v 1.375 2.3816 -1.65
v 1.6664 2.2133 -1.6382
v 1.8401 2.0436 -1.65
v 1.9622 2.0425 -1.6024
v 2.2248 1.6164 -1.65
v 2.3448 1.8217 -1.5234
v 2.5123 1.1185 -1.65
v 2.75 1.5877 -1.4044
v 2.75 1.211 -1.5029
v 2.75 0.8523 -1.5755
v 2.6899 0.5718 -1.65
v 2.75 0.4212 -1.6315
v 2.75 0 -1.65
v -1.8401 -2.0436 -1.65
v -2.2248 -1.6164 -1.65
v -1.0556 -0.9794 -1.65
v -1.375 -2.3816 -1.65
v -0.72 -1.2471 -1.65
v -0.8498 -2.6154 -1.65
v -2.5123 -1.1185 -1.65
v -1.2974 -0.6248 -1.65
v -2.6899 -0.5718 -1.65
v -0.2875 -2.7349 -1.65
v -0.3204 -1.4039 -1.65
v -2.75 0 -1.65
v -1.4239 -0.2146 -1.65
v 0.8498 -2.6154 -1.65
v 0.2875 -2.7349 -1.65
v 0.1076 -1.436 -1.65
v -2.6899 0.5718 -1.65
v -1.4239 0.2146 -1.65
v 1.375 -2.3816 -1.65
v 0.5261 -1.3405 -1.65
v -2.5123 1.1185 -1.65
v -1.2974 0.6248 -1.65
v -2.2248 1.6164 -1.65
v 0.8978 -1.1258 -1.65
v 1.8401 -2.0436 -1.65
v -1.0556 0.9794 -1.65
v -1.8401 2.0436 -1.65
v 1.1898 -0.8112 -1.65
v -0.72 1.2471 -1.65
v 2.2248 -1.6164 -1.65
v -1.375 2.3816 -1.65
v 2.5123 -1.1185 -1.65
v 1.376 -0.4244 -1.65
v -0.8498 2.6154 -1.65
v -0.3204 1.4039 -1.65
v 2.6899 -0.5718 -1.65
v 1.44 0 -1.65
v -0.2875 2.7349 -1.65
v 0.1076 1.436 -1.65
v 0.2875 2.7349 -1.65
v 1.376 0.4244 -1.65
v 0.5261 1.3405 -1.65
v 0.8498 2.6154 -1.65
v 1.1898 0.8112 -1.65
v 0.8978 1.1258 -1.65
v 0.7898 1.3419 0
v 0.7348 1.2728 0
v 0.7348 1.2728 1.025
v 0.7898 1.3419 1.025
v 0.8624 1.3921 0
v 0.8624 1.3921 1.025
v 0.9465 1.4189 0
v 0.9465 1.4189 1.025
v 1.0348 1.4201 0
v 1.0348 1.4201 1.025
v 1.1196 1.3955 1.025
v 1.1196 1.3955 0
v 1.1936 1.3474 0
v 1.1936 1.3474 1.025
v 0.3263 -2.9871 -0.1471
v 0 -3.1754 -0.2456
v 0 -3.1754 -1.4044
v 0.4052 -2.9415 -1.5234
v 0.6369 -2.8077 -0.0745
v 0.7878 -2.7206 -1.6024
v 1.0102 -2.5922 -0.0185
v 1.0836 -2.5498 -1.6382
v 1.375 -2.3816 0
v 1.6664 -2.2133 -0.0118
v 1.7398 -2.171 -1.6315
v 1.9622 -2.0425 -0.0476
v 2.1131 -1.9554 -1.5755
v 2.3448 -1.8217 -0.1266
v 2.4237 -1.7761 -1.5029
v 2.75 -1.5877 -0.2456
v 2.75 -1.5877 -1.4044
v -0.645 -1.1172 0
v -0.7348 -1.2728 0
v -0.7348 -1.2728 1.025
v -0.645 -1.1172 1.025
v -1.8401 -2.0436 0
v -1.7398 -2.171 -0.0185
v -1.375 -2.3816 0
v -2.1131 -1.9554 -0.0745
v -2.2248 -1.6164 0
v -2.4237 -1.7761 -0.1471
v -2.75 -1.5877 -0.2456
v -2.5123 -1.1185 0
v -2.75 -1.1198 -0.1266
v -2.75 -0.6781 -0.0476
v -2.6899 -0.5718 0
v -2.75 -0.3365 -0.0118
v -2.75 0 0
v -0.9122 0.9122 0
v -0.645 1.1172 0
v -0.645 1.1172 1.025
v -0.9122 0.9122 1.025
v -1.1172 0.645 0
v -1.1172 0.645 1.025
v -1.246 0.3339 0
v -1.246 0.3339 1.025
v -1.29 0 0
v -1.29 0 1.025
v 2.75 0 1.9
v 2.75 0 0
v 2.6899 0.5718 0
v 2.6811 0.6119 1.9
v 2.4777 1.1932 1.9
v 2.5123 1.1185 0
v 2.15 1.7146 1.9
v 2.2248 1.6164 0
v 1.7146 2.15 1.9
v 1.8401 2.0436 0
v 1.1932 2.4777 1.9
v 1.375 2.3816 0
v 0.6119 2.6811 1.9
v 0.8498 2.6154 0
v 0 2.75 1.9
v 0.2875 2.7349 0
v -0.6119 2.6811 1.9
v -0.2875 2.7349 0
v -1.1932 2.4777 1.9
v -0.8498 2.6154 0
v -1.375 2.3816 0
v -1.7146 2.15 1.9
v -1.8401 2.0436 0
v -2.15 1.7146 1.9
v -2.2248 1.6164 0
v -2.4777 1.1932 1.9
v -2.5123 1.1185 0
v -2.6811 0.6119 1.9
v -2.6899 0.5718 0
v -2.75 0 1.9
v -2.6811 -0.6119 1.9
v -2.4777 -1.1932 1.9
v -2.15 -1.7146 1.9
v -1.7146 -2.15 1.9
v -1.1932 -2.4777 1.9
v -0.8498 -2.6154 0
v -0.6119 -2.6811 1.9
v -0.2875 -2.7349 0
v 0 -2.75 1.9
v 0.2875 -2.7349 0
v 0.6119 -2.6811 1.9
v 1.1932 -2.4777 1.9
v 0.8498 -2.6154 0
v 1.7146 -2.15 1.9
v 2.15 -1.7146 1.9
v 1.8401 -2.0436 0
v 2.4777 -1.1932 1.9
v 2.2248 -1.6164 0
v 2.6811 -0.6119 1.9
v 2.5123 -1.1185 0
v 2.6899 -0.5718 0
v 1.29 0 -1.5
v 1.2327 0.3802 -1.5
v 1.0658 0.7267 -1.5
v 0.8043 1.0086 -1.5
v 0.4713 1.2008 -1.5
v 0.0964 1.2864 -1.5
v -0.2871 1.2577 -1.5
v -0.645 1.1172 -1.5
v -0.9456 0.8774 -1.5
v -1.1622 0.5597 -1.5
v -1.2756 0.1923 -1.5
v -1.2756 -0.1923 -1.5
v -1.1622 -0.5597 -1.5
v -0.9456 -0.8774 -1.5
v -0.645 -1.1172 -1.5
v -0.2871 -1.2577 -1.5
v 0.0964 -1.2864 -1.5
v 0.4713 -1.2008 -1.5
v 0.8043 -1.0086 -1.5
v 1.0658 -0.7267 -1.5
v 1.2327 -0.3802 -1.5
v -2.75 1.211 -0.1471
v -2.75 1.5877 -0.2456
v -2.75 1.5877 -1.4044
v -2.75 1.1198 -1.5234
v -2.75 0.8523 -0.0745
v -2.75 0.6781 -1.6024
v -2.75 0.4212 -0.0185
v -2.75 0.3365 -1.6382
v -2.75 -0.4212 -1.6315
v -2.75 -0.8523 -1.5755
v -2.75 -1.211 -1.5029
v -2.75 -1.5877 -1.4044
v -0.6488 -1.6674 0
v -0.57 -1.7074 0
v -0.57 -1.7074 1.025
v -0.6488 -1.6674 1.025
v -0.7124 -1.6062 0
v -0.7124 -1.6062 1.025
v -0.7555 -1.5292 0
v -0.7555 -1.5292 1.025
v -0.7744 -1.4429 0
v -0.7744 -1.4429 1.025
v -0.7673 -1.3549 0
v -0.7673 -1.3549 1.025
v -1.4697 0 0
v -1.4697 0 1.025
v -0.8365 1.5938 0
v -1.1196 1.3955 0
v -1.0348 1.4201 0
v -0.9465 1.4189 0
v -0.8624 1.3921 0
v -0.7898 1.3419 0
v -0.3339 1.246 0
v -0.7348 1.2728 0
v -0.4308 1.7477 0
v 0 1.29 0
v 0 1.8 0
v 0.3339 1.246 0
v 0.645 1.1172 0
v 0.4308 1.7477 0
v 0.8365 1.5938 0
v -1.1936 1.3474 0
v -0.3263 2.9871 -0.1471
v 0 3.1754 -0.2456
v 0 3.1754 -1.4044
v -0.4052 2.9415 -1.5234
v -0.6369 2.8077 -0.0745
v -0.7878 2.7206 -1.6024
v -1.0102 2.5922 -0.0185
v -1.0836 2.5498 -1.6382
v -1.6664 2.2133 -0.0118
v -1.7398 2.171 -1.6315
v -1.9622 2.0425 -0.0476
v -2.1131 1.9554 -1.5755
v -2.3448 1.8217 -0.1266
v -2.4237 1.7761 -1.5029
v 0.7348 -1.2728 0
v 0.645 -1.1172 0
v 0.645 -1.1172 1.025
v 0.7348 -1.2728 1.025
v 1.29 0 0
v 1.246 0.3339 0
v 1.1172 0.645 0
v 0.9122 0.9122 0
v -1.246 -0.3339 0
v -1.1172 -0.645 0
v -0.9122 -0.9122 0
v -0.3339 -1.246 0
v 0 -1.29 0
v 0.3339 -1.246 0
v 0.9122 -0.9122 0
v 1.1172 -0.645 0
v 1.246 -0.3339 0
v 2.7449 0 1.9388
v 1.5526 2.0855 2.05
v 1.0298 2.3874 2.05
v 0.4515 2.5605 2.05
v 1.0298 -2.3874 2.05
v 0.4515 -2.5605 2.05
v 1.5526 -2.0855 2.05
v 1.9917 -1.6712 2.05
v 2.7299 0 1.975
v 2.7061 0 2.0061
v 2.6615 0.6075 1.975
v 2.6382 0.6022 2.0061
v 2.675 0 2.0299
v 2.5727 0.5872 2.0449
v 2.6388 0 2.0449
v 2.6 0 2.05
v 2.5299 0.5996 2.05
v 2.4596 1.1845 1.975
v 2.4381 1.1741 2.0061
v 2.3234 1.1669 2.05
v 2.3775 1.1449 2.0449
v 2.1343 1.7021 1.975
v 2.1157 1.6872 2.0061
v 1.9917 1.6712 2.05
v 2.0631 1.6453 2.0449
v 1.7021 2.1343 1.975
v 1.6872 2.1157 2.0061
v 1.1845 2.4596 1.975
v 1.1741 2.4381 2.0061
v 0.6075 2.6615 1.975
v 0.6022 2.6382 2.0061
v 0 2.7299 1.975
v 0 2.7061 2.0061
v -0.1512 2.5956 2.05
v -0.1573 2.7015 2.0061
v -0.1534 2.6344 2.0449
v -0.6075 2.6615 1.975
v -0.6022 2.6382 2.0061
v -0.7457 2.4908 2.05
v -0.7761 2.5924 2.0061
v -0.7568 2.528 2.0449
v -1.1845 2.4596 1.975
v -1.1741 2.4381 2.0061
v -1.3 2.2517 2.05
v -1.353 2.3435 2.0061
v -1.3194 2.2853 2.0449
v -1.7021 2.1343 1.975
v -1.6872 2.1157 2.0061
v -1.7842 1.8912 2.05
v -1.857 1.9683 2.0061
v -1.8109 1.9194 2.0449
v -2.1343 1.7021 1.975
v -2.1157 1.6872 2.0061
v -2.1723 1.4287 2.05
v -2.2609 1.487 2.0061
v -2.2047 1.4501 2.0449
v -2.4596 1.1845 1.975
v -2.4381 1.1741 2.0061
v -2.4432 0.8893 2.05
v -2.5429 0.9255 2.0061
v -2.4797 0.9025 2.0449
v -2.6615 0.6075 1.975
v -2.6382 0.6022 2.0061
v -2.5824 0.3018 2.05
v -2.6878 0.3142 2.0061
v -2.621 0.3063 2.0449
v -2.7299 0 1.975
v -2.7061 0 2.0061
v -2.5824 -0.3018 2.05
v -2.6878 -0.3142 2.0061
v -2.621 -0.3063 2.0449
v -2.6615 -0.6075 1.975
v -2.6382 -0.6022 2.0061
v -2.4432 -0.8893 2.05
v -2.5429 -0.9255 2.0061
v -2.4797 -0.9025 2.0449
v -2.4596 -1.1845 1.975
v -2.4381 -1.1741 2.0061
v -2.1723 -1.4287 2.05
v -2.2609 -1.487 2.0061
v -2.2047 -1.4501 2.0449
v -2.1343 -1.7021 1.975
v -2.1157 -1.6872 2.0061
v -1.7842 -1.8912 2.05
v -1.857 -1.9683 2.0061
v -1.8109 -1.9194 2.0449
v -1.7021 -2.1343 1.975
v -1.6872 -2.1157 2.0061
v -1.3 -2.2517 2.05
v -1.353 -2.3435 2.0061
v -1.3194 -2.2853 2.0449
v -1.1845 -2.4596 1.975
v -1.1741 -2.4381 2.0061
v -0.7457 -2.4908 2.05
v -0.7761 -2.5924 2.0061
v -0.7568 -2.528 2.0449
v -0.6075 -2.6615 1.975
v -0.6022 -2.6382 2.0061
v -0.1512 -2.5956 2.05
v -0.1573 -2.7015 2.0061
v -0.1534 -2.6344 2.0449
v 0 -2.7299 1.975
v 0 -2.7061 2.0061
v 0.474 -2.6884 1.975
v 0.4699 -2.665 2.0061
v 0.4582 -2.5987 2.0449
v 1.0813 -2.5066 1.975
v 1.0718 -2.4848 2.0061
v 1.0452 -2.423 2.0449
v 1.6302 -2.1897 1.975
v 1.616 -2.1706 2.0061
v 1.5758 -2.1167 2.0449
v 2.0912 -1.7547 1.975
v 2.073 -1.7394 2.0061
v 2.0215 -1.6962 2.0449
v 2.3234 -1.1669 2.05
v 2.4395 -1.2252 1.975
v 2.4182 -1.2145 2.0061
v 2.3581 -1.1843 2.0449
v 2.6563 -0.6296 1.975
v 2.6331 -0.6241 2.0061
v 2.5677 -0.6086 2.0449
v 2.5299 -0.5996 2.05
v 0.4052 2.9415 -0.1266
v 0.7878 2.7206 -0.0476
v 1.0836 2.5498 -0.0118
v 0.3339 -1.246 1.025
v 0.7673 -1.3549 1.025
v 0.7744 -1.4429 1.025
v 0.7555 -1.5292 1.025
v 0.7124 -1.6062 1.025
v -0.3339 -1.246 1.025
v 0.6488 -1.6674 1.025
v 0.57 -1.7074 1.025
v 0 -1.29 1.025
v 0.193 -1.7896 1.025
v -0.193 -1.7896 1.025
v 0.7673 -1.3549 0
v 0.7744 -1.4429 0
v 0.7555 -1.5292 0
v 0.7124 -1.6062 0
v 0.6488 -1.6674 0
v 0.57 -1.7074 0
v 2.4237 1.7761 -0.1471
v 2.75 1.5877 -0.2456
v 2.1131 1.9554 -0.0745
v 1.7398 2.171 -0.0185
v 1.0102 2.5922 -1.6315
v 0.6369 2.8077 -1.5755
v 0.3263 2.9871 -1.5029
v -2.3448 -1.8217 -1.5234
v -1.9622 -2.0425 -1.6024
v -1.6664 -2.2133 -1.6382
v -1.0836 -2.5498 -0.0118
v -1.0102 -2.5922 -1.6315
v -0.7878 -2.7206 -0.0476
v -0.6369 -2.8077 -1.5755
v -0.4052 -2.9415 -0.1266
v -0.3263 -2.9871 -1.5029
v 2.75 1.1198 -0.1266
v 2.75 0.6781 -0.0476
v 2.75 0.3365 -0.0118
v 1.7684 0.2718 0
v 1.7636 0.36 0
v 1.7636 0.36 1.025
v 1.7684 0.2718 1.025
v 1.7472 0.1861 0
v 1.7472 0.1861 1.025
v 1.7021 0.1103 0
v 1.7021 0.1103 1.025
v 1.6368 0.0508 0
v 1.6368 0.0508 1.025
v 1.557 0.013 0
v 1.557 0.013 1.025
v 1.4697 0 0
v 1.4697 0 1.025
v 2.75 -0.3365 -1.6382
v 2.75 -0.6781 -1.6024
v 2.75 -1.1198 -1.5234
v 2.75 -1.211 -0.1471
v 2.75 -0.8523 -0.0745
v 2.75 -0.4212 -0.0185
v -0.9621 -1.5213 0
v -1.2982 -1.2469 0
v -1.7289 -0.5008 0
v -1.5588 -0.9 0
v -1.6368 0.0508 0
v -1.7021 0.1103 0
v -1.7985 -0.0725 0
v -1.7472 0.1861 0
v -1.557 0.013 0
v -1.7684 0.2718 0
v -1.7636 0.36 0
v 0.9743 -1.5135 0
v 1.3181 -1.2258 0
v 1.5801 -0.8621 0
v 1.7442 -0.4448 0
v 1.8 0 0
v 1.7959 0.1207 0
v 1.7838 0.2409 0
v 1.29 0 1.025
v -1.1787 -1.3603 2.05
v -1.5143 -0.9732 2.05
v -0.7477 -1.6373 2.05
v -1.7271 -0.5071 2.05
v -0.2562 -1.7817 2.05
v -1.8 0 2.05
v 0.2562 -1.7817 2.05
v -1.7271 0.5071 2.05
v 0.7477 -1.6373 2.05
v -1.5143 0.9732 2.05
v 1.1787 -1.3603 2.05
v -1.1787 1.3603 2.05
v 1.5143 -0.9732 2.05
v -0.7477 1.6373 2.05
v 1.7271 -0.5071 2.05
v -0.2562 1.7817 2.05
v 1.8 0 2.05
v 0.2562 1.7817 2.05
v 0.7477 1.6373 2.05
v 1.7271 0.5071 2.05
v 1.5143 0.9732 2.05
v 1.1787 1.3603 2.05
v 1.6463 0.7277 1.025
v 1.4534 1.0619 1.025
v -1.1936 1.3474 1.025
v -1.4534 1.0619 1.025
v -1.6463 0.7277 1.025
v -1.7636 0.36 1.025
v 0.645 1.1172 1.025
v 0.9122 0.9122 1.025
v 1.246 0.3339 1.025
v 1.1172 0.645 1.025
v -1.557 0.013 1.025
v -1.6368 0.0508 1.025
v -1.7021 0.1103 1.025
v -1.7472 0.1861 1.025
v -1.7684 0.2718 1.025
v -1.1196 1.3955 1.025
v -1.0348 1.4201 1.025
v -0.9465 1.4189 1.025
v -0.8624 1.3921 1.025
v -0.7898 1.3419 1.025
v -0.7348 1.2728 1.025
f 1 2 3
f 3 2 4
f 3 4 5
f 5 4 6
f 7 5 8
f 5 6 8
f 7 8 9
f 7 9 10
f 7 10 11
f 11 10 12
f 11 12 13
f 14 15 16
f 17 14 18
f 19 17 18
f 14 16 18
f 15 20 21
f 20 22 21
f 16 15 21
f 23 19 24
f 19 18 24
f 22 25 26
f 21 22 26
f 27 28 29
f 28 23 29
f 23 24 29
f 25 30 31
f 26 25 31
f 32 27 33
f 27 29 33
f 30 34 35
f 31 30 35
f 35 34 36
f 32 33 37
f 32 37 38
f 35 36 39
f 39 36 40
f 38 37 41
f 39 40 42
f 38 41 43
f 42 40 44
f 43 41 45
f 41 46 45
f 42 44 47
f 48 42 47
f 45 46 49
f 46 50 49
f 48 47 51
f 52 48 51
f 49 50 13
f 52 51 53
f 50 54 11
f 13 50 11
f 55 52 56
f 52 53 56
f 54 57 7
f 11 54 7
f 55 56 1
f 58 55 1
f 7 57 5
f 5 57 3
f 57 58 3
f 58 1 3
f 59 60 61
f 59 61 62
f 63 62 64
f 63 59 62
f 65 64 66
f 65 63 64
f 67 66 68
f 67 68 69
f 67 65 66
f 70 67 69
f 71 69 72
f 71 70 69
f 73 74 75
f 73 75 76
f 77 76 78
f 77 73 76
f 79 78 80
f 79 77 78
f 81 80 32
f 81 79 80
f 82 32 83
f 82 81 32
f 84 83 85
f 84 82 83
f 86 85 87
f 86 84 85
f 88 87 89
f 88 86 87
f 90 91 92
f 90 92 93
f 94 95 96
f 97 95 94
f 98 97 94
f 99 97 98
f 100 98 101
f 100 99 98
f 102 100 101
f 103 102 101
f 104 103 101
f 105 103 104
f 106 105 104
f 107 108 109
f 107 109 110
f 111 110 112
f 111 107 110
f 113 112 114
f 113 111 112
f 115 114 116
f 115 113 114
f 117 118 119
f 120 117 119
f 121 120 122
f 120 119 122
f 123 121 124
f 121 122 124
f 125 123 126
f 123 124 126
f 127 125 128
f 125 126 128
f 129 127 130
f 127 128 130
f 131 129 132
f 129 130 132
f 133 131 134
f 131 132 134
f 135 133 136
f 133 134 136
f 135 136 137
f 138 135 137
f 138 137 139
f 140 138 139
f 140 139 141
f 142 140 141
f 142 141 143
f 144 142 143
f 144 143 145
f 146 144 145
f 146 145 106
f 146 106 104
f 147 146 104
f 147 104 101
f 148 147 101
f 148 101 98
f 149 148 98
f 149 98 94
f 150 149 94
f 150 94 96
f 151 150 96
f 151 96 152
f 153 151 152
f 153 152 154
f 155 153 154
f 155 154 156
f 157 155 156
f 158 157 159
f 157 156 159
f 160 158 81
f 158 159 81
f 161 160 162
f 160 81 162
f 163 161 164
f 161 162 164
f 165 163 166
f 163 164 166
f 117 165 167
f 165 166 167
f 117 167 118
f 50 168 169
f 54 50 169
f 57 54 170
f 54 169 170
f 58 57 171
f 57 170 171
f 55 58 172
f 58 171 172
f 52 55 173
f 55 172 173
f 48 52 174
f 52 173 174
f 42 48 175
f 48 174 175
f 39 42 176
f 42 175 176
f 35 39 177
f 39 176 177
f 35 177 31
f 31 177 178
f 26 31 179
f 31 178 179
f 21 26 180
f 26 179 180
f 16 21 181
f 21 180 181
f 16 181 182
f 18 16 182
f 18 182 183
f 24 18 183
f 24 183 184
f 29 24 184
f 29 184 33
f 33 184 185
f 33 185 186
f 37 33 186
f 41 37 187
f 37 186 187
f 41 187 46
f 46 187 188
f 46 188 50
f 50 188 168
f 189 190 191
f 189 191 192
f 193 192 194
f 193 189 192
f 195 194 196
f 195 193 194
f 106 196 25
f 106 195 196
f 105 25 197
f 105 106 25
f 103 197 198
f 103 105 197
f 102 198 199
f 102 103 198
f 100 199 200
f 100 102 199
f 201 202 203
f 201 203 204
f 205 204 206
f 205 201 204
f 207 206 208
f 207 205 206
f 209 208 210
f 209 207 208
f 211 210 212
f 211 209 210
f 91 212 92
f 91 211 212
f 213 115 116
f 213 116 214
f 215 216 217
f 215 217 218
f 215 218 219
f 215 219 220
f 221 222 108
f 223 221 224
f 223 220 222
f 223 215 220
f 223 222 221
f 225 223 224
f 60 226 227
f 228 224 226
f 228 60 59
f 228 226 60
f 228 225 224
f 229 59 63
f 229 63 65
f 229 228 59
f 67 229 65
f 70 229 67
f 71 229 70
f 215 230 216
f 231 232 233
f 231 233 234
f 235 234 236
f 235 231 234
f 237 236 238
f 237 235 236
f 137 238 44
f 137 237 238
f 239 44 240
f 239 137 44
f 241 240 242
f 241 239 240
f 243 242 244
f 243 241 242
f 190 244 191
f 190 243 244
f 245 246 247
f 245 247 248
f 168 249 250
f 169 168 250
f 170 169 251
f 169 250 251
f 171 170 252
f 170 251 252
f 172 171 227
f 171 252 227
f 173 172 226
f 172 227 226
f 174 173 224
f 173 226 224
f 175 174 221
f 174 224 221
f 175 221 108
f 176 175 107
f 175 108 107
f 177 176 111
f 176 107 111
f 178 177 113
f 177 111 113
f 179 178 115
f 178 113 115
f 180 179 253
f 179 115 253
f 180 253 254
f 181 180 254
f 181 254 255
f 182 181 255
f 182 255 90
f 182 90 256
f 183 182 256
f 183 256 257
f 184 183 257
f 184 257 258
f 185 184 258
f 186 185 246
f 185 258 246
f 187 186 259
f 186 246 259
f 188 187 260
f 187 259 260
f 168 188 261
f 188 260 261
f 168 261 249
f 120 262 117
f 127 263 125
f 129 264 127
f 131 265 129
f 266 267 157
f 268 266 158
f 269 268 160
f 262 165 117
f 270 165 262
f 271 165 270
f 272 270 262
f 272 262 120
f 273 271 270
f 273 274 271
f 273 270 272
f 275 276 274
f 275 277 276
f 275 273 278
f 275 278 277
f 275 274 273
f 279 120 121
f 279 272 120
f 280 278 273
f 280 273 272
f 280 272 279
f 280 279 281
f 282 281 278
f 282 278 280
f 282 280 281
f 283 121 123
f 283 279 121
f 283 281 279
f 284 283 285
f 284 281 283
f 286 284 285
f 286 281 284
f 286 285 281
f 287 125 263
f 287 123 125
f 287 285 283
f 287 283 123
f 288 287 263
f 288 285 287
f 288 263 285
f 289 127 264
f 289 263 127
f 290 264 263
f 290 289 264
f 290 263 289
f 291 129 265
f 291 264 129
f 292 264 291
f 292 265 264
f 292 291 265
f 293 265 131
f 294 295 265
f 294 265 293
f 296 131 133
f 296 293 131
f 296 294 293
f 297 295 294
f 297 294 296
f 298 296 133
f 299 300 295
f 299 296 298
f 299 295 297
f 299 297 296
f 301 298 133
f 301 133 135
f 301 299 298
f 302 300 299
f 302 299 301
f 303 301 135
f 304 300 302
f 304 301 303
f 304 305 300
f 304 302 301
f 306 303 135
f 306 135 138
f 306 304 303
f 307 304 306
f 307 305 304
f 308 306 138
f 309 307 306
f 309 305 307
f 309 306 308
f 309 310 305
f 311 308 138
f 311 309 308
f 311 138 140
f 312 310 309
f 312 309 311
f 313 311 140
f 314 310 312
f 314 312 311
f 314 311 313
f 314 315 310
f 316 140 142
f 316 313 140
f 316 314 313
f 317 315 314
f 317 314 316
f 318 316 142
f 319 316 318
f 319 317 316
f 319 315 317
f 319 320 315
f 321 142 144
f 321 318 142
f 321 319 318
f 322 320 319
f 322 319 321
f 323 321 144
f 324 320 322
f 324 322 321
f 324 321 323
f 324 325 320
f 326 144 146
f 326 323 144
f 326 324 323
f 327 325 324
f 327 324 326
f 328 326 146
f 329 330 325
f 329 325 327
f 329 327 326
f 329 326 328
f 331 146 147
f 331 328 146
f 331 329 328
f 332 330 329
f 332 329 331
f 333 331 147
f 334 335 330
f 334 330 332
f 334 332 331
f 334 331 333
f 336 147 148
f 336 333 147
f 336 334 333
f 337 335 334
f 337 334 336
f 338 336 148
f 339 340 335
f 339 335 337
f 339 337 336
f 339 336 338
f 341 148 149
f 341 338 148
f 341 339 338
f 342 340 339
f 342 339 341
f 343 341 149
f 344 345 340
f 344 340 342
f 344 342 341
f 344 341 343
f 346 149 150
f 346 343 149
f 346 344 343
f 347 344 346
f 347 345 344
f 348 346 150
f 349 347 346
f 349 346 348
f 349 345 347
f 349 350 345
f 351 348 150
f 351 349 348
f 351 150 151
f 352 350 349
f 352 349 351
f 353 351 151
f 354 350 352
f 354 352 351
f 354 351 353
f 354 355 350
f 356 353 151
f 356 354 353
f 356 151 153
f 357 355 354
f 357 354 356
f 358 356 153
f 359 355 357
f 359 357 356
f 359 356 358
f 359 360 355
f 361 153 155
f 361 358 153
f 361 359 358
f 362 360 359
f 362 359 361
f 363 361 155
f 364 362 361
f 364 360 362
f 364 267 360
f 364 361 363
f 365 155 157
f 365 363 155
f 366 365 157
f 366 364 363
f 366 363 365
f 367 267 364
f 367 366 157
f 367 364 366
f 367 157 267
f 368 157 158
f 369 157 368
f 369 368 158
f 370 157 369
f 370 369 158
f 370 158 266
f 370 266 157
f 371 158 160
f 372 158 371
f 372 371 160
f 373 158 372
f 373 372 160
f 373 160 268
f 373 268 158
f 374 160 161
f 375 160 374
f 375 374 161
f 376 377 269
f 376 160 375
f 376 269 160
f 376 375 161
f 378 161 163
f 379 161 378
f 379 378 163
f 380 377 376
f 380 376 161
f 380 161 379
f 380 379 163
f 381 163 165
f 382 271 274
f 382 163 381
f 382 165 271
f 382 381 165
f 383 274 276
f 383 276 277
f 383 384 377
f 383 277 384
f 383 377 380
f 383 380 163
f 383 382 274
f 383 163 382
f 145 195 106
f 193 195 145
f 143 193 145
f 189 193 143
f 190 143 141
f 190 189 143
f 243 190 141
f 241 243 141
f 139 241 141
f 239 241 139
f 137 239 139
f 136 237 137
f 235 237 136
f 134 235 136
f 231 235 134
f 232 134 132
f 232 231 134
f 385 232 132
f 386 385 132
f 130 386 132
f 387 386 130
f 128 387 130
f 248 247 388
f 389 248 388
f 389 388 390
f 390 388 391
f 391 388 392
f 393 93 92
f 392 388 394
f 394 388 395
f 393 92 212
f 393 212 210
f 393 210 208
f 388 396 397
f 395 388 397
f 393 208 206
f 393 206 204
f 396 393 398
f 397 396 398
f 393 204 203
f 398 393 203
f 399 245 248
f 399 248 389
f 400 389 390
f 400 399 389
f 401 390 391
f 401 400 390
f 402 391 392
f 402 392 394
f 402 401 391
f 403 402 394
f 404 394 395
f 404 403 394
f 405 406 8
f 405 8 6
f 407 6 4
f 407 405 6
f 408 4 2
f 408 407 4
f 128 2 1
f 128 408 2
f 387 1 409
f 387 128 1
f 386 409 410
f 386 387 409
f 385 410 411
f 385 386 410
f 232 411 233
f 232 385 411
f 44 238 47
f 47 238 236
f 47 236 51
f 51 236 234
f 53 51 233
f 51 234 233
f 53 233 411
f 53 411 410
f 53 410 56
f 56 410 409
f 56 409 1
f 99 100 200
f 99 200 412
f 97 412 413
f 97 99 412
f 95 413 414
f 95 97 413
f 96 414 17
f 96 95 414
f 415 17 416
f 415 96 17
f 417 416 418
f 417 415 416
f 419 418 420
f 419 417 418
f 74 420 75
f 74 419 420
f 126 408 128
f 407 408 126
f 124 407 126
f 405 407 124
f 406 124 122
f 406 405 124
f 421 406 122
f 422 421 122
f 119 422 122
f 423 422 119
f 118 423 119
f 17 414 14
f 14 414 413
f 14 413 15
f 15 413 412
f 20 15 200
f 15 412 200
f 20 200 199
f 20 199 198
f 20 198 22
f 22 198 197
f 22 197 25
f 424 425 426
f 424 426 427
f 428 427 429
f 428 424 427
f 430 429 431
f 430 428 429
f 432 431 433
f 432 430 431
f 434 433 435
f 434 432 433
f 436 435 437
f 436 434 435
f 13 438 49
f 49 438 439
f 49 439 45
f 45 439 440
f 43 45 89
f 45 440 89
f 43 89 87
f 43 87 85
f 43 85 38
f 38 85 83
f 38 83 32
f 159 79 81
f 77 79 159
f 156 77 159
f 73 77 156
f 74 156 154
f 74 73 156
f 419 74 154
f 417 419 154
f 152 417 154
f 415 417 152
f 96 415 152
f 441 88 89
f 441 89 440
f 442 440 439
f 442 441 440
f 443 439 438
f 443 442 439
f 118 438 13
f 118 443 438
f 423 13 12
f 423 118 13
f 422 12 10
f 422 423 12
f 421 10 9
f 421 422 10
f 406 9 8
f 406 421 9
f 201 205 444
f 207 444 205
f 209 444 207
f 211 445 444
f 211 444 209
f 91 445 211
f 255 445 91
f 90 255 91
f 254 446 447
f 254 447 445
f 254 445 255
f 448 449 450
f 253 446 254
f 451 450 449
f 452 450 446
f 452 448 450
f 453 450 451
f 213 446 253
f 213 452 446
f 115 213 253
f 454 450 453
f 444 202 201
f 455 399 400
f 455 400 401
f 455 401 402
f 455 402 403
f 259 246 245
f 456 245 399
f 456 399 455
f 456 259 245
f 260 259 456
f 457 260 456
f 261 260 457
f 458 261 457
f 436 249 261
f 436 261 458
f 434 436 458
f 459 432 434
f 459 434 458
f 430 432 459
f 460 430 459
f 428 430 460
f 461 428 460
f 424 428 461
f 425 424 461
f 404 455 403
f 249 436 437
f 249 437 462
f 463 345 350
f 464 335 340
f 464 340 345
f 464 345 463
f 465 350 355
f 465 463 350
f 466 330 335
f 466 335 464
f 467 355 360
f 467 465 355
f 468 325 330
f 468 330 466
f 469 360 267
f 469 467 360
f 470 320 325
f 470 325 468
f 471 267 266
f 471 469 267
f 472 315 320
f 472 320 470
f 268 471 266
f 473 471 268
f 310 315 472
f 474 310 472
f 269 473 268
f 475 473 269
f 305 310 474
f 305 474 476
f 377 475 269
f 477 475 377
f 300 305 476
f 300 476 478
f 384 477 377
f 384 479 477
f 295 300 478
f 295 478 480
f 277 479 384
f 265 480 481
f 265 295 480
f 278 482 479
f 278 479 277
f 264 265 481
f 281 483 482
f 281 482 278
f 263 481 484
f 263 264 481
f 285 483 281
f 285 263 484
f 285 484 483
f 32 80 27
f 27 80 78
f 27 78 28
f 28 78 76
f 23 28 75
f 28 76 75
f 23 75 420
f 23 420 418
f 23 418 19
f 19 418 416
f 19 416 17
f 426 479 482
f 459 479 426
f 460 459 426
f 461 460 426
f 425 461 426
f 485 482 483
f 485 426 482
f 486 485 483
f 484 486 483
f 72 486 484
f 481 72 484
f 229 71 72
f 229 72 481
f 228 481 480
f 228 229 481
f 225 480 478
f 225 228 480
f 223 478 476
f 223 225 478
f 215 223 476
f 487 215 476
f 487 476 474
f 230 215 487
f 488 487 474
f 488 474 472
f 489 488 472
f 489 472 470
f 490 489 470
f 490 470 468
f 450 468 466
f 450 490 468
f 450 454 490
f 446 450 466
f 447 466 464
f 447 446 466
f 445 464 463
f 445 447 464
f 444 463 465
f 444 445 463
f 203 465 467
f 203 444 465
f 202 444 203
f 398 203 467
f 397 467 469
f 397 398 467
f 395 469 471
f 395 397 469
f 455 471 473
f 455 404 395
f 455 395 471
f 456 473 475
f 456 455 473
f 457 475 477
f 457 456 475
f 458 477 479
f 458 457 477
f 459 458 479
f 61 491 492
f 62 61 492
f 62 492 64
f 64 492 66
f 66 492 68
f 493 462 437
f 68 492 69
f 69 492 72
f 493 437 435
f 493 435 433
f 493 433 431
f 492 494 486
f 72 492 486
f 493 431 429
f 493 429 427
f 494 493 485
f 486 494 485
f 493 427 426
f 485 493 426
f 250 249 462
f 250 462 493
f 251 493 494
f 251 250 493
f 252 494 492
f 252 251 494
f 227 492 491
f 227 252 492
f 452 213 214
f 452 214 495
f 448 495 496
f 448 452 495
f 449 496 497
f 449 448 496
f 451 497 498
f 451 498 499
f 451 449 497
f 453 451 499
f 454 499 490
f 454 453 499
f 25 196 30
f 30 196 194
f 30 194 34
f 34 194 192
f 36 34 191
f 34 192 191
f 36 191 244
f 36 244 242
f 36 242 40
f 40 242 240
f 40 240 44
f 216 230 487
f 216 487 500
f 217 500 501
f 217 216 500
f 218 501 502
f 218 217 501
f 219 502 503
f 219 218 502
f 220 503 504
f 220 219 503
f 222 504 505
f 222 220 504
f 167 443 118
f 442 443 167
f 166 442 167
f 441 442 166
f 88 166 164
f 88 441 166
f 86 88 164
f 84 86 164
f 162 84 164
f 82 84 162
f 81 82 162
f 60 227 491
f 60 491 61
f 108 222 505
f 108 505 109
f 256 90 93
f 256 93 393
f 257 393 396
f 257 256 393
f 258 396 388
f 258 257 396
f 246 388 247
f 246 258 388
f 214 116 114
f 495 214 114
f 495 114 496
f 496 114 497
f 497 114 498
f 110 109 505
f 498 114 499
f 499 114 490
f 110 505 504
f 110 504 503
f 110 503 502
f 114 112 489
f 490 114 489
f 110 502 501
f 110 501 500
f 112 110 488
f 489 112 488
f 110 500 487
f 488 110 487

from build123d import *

# Parameters (mm, degrees)
SKETCH_1_R               = 1.29
EXTRUDE_1_DEPTH          = 1.65
CHAMFER_1_SIZE           = 0.15
SKETCH_3_R               = 2.75
SKETCH_3_R_2             = 1.8
EXTRUDE_2_DEPTH          = 2.05
FILLET_1_R               = 0.15
EXTRUDE_3_DEPTH          = 1.025
PATTERN_CIRCULAR_1_COUNT = 3


with BuildPart() as part:
    # 草图1 → 凸台-拉伸1 (new body)
    with BuildSketch(Plane.XY):
        Polygon((0, 3.175426481), (-2.75, 1.58771324), (-2.75, -1.58771324), (0, -3.175426481), (2.75, -1.58771324), (2.75, 1.58771324), align=None)
        Circle(SKETCH_1_R, mode=Mode.SUBTRACT)
    extrude(amount=-EXTRUDE_1_DEPTH)

    # 草图2 → 切除-旋转1 (revolve, cut)
    with BuildSketch(Plane(origin=(0, 0, 0), x_dir=(0, 0, -1), z_dir=(1, 0, 0))):
        Polygon((0, 2.75), (0.245620093, 3.175426481), (0, 3.175426481), align=None)
        Polygon((1.65, 2.75), (1.404379907, 3.175426481), (1.65, 3.175426481), align=None)
    revolve(axis=Axis((0, 0, 0), (0, 0, -1)), mode=Mode.SUBTRACT)

    # 倒角1
    chamfer_1_edges = [part.edges().sort_by_distance(p)[0] for p in [
        (-1.29, 0, -1.65),
    ]]
    chamfer(chamfer_1_edges, length=CHAMFER_1_SIZE)

    # 草图3 → 凸台-拉伸2 (add)
    with BuildSketch(Plane.XY):
        Circle(SKETCH_3_R)
        Circle(SKETCH_3_R_2, mode=Mode.SUBTRACT)
    extrude(amount=EXTRUDE_2_DEPTH)

    # 圆角1
    fillet_1_edges = [part.edges().sort_by_distance(p)[0] for p in [
        (-2.75, 0, 2.05),
    ]]
    fillet(fillet_1_edges, radius=FILLET_1_R)

    # 草图4 → 凸台-拉伸3 (add)
    with BuildSketch(Plane.XY):
        with BuildLine():
            Line((-1.29, 0), (-1.469693846, 0))
            ThreePointArc((-1.469693846, 0), (-1.702072846, 0.11026334), (-1.763632615, 0.36))
            ThreePointArc((-1.763632615, 0.36), (-1.558845727, 0.9), (-1.193585453, 1.347350647))
            ThreePointArc((-1.193585453, 1.347350647), (-0.946527277, 1.418906654), (-0.734846923, 1.272792206))
            Line((-0.734846923, 1.272792206), (-0.645, 1.117172771))
            ThreePointArc((-0.645, 1.117172771), (-1.117172771, 0.645), (-1.29, 0))
        make_face()
    extrude_3 = extrude(amount=EXTRUDE_3_DEPTH)

    # 阵列(圆周)1: 凸台-拉伸3 ×3 about axis
    pattern_circular_1_axis = Axis((0, 0, 0), (0, 0, 1))
    for i in range(1, PATTERN_CIRCULAR_1_COUNT):
        add(extrude_3.rotate(pattern_circular_1_axis, i * 360 / PATTERN_CIRCULAR_1_COUNT))


solid = part.part
